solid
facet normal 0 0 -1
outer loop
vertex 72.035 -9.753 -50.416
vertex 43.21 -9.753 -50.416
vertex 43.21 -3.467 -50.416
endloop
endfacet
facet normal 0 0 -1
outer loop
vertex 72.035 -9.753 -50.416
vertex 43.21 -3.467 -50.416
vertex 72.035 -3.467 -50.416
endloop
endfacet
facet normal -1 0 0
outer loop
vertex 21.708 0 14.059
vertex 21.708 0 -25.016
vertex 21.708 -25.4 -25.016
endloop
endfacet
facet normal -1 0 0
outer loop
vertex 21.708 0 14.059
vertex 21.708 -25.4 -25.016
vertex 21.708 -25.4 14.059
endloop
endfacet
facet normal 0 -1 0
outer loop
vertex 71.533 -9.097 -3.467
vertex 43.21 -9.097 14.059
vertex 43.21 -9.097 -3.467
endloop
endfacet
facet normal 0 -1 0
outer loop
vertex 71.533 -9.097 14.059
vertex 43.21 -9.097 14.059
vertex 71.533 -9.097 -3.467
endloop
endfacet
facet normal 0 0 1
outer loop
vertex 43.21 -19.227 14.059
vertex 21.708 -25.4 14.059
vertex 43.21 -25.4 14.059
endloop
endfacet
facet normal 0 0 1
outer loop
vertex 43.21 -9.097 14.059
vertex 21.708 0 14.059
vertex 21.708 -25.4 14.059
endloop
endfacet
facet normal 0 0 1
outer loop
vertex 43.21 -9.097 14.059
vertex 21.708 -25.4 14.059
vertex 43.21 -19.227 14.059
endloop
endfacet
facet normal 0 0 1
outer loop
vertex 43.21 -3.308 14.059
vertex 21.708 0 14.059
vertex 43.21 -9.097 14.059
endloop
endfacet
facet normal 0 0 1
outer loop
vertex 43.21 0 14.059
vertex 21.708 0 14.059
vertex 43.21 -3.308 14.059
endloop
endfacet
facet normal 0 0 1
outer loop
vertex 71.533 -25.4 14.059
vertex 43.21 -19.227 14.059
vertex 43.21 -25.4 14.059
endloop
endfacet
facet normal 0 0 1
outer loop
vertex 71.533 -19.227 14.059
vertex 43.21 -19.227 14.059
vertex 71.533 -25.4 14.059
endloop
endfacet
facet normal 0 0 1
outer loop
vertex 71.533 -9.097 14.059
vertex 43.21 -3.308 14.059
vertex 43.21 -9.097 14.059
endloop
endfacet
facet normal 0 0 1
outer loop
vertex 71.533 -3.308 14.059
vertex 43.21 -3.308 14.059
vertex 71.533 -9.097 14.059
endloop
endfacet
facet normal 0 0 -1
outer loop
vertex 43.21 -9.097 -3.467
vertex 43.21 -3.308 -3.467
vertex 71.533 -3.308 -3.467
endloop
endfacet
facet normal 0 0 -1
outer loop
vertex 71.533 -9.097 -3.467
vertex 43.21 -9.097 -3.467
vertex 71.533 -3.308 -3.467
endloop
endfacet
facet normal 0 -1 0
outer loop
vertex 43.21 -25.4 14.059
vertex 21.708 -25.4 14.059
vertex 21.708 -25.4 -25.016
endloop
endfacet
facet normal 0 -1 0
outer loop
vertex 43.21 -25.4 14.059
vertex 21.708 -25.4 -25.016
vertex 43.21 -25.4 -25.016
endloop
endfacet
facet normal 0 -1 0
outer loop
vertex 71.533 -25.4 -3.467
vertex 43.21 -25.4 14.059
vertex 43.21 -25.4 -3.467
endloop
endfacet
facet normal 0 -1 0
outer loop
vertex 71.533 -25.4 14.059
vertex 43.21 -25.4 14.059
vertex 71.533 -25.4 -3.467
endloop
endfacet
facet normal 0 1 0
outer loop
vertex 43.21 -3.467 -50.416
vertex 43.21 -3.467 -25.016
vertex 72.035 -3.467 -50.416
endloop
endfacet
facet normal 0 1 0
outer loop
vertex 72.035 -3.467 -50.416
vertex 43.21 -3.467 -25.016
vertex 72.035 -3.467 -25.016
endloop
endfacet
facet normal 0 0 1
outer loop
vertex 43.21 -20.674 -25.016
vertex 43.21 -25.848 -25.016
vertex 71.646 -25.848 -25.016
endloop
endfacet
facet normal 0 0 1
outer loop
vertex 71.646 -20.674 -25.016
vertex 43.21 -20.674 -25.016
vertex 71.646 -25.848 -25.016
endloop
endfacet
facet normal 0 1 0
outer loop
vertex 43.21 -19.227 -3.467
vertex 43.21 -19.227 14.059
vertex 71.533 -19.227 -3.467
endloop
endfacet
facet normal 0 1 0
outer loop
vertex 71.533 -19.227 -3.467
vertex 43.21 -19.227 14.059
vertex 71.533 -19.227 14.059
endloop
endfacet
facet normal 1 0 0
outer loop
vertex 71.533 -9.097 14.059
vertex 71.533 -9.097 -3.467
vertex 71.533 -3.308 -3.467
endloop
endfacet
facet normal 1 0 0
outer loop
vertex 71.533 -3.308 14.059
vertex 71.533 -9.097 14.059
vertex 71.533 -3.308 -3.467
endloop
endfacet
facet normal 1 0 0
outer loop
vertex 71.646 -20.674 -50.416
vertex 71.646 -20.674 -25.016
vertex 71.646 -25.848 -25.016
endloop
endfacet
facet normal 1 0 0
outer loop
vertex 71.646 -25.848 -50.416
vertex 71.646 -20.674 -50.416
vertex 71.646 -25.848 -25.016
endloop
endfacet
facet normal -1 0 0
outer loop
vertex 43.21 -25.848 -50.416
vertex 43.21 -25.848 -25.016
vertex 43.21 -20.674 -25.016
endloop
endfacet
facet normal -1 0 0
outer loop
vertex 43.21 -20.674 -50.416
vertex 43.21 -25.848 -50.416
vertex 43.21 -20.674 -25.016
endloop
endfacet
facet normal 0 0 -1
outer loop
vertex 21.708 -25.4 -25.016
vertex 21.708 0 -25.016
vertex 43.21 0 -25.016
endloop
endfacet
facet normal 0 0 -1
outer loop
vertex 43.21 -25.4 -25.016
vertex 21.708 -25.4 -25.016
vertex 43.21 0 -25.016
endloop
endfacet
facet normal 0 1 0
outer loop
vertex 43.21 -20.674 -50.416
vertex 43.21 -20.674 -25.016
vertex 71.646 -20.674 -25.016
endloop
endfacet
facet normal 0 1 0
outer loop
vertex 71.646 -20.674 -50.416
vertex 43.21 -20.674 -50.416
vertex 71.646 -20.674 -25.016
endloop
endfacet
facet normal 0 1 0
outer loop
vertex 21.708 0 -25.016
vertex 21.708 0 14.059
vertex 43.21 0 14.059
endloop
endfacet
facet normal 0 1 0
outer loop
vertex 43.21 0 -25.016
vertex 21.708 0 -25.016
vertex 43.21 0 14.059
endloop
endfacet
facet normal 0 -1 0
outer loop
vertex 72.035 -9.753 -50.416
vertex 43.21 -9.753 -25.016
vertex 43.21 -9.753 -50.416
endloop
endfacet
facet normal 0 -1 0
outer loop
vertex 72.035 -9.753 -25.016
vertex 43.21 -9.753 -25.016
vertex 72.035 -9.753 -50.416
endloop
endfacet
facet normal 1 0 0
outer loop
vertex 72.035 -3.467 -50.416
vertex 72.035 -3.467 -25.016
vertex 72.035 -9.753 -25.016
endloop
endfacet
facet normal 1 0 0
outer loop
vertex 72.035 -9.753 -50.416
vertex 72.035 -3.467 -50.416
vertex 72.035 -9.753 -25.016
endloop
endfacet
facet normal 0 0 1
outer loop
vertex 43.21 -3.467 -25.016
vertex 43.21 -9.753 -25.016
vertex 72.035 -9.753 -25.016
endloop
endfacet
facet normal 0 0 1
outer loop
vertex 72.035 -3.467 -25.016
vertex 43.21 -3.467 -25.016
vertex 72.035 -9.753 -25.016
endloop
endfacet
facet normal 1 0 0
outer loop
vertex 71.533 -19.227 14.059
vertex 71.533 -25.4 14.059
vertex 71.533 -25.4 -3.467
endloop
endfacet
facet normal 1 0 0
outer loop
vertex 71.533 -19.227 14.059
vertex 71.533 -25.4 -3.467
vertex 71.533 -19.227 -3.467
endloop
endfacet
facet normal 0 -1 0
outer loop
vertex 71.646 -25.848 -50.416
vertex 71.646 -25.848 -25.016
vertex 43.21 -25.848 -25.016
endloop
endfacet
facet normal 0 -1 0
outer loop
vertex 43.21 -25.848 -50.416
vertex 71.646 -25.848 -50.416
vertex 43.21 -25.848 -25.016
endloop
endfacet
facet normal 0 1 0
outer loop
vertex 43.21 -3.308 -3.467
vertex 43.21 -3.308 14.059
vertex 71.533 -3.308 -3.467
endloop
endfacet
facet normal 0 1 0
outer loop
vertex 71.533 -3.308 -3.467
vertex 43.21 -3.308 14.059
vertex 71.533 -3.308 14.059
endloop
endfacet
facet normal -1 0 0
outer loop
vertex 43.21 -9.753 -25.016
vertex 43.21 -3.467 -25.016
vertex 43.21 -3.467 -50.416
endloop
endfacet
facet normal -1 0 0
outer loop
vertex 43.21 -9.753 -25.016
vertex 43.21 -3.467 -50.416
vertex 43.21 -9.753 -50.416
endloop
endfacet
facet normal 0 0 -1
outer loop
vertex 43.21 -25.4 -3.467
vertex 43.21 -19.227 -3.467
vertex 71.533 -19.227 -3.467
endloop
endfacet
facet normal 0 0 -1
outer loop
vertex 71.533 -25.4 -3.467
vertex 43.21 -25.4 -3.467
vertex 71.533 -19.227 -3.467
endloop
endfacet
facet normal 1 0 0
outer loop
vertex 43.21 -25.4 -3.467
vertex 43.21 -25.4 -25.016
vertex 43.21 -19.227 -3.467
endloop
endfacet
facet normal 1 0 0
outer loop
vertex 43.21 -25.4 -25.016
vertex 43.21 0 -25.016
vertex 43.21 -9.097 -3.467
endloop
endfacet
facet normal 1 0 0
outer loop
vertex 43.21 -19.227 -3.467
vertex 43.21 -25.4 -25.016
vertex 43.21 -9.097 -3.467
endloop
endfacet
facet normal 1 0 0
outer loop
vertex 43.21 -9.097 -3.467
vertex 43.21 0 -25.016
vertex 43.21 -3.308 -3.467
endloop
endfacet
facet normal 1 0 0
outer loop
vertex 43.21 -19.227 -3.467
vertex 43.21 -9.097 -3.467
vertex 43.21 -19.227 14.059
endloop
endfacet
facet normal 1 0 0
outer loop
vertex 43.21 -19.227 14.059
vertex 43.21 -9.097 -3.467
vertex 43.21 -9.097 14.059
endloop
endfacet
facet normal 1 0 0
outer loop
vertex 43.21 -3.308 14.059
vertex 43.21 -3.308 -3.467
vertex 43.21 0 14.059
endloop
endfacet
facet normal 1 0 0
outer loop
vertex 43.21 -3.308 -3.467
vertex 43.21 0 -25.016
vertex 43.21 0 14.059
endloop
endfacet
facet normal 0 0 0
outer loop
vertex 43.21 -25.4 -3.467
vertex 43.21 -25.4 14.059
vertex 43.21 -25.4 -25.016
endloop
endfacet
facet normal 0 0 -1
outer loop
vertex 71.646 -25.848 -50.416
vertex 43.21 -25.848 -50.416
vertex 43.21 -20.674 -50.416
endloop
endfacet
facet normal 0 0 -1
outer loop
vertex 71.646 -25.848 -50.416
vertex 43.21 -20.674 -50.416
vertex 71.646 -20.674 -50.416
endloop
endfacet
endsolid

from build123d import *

# Parameters (mm, degrees)
F1_W     = 21.501394
F1_H     = 39.074652
F2_DEPTH = 25.4
F3_W     = 28.323952
F3_H     = 6.172791
F3_H_2   = 5.788837
F4_DEPTH = 17.526
F5_W     = 28.825473
F5_H     = 6.28651
F6_DEPTH = 25.4


with BuildPart() as f2:
    # F1 (on face) → F2 (new body)
    with BuildSketch(Plane.XZ):
        with Locations((32.458837, -5.478721)):
            Rectangle(F1_W, F1_H)
    extrude(amount=F2_DEPTH)

    # F3 (on face) → F4 (join)
    with BuildSketch(Plane.XY.offset(14.058605)):
        with Locations((57.37151, -22.313604)):
            Rectangle(F3_W, F3_H)
        with Locations((57.37151, -6.202325)):
            Rectangle(F3_W, F3_H_2)
    extrude(amount=-F4_DEPTH)


with BuildPart() as f6:
    # F5 (on face) → F6 (new body)
    with BuildSketch(Plane(origin=(0, 0, -25.016047), x_dir=(1, 0, 0), z_dir=(0, 0, -1))):
        Polygon((43.209534, 25.84812), (43.209534, 22.948604), (43.209534, 20.674419), (54.16698, 20.674419), (71.645655, 20.674419), (71.645655, 25.84812), align=None)
        with Locations((57.62227, 6.610119)):
            Rectangle(F5_W, F5_H)
    extrude(amount=F6_DEPTH)


solid = Compound([f2.part, f6.part])
